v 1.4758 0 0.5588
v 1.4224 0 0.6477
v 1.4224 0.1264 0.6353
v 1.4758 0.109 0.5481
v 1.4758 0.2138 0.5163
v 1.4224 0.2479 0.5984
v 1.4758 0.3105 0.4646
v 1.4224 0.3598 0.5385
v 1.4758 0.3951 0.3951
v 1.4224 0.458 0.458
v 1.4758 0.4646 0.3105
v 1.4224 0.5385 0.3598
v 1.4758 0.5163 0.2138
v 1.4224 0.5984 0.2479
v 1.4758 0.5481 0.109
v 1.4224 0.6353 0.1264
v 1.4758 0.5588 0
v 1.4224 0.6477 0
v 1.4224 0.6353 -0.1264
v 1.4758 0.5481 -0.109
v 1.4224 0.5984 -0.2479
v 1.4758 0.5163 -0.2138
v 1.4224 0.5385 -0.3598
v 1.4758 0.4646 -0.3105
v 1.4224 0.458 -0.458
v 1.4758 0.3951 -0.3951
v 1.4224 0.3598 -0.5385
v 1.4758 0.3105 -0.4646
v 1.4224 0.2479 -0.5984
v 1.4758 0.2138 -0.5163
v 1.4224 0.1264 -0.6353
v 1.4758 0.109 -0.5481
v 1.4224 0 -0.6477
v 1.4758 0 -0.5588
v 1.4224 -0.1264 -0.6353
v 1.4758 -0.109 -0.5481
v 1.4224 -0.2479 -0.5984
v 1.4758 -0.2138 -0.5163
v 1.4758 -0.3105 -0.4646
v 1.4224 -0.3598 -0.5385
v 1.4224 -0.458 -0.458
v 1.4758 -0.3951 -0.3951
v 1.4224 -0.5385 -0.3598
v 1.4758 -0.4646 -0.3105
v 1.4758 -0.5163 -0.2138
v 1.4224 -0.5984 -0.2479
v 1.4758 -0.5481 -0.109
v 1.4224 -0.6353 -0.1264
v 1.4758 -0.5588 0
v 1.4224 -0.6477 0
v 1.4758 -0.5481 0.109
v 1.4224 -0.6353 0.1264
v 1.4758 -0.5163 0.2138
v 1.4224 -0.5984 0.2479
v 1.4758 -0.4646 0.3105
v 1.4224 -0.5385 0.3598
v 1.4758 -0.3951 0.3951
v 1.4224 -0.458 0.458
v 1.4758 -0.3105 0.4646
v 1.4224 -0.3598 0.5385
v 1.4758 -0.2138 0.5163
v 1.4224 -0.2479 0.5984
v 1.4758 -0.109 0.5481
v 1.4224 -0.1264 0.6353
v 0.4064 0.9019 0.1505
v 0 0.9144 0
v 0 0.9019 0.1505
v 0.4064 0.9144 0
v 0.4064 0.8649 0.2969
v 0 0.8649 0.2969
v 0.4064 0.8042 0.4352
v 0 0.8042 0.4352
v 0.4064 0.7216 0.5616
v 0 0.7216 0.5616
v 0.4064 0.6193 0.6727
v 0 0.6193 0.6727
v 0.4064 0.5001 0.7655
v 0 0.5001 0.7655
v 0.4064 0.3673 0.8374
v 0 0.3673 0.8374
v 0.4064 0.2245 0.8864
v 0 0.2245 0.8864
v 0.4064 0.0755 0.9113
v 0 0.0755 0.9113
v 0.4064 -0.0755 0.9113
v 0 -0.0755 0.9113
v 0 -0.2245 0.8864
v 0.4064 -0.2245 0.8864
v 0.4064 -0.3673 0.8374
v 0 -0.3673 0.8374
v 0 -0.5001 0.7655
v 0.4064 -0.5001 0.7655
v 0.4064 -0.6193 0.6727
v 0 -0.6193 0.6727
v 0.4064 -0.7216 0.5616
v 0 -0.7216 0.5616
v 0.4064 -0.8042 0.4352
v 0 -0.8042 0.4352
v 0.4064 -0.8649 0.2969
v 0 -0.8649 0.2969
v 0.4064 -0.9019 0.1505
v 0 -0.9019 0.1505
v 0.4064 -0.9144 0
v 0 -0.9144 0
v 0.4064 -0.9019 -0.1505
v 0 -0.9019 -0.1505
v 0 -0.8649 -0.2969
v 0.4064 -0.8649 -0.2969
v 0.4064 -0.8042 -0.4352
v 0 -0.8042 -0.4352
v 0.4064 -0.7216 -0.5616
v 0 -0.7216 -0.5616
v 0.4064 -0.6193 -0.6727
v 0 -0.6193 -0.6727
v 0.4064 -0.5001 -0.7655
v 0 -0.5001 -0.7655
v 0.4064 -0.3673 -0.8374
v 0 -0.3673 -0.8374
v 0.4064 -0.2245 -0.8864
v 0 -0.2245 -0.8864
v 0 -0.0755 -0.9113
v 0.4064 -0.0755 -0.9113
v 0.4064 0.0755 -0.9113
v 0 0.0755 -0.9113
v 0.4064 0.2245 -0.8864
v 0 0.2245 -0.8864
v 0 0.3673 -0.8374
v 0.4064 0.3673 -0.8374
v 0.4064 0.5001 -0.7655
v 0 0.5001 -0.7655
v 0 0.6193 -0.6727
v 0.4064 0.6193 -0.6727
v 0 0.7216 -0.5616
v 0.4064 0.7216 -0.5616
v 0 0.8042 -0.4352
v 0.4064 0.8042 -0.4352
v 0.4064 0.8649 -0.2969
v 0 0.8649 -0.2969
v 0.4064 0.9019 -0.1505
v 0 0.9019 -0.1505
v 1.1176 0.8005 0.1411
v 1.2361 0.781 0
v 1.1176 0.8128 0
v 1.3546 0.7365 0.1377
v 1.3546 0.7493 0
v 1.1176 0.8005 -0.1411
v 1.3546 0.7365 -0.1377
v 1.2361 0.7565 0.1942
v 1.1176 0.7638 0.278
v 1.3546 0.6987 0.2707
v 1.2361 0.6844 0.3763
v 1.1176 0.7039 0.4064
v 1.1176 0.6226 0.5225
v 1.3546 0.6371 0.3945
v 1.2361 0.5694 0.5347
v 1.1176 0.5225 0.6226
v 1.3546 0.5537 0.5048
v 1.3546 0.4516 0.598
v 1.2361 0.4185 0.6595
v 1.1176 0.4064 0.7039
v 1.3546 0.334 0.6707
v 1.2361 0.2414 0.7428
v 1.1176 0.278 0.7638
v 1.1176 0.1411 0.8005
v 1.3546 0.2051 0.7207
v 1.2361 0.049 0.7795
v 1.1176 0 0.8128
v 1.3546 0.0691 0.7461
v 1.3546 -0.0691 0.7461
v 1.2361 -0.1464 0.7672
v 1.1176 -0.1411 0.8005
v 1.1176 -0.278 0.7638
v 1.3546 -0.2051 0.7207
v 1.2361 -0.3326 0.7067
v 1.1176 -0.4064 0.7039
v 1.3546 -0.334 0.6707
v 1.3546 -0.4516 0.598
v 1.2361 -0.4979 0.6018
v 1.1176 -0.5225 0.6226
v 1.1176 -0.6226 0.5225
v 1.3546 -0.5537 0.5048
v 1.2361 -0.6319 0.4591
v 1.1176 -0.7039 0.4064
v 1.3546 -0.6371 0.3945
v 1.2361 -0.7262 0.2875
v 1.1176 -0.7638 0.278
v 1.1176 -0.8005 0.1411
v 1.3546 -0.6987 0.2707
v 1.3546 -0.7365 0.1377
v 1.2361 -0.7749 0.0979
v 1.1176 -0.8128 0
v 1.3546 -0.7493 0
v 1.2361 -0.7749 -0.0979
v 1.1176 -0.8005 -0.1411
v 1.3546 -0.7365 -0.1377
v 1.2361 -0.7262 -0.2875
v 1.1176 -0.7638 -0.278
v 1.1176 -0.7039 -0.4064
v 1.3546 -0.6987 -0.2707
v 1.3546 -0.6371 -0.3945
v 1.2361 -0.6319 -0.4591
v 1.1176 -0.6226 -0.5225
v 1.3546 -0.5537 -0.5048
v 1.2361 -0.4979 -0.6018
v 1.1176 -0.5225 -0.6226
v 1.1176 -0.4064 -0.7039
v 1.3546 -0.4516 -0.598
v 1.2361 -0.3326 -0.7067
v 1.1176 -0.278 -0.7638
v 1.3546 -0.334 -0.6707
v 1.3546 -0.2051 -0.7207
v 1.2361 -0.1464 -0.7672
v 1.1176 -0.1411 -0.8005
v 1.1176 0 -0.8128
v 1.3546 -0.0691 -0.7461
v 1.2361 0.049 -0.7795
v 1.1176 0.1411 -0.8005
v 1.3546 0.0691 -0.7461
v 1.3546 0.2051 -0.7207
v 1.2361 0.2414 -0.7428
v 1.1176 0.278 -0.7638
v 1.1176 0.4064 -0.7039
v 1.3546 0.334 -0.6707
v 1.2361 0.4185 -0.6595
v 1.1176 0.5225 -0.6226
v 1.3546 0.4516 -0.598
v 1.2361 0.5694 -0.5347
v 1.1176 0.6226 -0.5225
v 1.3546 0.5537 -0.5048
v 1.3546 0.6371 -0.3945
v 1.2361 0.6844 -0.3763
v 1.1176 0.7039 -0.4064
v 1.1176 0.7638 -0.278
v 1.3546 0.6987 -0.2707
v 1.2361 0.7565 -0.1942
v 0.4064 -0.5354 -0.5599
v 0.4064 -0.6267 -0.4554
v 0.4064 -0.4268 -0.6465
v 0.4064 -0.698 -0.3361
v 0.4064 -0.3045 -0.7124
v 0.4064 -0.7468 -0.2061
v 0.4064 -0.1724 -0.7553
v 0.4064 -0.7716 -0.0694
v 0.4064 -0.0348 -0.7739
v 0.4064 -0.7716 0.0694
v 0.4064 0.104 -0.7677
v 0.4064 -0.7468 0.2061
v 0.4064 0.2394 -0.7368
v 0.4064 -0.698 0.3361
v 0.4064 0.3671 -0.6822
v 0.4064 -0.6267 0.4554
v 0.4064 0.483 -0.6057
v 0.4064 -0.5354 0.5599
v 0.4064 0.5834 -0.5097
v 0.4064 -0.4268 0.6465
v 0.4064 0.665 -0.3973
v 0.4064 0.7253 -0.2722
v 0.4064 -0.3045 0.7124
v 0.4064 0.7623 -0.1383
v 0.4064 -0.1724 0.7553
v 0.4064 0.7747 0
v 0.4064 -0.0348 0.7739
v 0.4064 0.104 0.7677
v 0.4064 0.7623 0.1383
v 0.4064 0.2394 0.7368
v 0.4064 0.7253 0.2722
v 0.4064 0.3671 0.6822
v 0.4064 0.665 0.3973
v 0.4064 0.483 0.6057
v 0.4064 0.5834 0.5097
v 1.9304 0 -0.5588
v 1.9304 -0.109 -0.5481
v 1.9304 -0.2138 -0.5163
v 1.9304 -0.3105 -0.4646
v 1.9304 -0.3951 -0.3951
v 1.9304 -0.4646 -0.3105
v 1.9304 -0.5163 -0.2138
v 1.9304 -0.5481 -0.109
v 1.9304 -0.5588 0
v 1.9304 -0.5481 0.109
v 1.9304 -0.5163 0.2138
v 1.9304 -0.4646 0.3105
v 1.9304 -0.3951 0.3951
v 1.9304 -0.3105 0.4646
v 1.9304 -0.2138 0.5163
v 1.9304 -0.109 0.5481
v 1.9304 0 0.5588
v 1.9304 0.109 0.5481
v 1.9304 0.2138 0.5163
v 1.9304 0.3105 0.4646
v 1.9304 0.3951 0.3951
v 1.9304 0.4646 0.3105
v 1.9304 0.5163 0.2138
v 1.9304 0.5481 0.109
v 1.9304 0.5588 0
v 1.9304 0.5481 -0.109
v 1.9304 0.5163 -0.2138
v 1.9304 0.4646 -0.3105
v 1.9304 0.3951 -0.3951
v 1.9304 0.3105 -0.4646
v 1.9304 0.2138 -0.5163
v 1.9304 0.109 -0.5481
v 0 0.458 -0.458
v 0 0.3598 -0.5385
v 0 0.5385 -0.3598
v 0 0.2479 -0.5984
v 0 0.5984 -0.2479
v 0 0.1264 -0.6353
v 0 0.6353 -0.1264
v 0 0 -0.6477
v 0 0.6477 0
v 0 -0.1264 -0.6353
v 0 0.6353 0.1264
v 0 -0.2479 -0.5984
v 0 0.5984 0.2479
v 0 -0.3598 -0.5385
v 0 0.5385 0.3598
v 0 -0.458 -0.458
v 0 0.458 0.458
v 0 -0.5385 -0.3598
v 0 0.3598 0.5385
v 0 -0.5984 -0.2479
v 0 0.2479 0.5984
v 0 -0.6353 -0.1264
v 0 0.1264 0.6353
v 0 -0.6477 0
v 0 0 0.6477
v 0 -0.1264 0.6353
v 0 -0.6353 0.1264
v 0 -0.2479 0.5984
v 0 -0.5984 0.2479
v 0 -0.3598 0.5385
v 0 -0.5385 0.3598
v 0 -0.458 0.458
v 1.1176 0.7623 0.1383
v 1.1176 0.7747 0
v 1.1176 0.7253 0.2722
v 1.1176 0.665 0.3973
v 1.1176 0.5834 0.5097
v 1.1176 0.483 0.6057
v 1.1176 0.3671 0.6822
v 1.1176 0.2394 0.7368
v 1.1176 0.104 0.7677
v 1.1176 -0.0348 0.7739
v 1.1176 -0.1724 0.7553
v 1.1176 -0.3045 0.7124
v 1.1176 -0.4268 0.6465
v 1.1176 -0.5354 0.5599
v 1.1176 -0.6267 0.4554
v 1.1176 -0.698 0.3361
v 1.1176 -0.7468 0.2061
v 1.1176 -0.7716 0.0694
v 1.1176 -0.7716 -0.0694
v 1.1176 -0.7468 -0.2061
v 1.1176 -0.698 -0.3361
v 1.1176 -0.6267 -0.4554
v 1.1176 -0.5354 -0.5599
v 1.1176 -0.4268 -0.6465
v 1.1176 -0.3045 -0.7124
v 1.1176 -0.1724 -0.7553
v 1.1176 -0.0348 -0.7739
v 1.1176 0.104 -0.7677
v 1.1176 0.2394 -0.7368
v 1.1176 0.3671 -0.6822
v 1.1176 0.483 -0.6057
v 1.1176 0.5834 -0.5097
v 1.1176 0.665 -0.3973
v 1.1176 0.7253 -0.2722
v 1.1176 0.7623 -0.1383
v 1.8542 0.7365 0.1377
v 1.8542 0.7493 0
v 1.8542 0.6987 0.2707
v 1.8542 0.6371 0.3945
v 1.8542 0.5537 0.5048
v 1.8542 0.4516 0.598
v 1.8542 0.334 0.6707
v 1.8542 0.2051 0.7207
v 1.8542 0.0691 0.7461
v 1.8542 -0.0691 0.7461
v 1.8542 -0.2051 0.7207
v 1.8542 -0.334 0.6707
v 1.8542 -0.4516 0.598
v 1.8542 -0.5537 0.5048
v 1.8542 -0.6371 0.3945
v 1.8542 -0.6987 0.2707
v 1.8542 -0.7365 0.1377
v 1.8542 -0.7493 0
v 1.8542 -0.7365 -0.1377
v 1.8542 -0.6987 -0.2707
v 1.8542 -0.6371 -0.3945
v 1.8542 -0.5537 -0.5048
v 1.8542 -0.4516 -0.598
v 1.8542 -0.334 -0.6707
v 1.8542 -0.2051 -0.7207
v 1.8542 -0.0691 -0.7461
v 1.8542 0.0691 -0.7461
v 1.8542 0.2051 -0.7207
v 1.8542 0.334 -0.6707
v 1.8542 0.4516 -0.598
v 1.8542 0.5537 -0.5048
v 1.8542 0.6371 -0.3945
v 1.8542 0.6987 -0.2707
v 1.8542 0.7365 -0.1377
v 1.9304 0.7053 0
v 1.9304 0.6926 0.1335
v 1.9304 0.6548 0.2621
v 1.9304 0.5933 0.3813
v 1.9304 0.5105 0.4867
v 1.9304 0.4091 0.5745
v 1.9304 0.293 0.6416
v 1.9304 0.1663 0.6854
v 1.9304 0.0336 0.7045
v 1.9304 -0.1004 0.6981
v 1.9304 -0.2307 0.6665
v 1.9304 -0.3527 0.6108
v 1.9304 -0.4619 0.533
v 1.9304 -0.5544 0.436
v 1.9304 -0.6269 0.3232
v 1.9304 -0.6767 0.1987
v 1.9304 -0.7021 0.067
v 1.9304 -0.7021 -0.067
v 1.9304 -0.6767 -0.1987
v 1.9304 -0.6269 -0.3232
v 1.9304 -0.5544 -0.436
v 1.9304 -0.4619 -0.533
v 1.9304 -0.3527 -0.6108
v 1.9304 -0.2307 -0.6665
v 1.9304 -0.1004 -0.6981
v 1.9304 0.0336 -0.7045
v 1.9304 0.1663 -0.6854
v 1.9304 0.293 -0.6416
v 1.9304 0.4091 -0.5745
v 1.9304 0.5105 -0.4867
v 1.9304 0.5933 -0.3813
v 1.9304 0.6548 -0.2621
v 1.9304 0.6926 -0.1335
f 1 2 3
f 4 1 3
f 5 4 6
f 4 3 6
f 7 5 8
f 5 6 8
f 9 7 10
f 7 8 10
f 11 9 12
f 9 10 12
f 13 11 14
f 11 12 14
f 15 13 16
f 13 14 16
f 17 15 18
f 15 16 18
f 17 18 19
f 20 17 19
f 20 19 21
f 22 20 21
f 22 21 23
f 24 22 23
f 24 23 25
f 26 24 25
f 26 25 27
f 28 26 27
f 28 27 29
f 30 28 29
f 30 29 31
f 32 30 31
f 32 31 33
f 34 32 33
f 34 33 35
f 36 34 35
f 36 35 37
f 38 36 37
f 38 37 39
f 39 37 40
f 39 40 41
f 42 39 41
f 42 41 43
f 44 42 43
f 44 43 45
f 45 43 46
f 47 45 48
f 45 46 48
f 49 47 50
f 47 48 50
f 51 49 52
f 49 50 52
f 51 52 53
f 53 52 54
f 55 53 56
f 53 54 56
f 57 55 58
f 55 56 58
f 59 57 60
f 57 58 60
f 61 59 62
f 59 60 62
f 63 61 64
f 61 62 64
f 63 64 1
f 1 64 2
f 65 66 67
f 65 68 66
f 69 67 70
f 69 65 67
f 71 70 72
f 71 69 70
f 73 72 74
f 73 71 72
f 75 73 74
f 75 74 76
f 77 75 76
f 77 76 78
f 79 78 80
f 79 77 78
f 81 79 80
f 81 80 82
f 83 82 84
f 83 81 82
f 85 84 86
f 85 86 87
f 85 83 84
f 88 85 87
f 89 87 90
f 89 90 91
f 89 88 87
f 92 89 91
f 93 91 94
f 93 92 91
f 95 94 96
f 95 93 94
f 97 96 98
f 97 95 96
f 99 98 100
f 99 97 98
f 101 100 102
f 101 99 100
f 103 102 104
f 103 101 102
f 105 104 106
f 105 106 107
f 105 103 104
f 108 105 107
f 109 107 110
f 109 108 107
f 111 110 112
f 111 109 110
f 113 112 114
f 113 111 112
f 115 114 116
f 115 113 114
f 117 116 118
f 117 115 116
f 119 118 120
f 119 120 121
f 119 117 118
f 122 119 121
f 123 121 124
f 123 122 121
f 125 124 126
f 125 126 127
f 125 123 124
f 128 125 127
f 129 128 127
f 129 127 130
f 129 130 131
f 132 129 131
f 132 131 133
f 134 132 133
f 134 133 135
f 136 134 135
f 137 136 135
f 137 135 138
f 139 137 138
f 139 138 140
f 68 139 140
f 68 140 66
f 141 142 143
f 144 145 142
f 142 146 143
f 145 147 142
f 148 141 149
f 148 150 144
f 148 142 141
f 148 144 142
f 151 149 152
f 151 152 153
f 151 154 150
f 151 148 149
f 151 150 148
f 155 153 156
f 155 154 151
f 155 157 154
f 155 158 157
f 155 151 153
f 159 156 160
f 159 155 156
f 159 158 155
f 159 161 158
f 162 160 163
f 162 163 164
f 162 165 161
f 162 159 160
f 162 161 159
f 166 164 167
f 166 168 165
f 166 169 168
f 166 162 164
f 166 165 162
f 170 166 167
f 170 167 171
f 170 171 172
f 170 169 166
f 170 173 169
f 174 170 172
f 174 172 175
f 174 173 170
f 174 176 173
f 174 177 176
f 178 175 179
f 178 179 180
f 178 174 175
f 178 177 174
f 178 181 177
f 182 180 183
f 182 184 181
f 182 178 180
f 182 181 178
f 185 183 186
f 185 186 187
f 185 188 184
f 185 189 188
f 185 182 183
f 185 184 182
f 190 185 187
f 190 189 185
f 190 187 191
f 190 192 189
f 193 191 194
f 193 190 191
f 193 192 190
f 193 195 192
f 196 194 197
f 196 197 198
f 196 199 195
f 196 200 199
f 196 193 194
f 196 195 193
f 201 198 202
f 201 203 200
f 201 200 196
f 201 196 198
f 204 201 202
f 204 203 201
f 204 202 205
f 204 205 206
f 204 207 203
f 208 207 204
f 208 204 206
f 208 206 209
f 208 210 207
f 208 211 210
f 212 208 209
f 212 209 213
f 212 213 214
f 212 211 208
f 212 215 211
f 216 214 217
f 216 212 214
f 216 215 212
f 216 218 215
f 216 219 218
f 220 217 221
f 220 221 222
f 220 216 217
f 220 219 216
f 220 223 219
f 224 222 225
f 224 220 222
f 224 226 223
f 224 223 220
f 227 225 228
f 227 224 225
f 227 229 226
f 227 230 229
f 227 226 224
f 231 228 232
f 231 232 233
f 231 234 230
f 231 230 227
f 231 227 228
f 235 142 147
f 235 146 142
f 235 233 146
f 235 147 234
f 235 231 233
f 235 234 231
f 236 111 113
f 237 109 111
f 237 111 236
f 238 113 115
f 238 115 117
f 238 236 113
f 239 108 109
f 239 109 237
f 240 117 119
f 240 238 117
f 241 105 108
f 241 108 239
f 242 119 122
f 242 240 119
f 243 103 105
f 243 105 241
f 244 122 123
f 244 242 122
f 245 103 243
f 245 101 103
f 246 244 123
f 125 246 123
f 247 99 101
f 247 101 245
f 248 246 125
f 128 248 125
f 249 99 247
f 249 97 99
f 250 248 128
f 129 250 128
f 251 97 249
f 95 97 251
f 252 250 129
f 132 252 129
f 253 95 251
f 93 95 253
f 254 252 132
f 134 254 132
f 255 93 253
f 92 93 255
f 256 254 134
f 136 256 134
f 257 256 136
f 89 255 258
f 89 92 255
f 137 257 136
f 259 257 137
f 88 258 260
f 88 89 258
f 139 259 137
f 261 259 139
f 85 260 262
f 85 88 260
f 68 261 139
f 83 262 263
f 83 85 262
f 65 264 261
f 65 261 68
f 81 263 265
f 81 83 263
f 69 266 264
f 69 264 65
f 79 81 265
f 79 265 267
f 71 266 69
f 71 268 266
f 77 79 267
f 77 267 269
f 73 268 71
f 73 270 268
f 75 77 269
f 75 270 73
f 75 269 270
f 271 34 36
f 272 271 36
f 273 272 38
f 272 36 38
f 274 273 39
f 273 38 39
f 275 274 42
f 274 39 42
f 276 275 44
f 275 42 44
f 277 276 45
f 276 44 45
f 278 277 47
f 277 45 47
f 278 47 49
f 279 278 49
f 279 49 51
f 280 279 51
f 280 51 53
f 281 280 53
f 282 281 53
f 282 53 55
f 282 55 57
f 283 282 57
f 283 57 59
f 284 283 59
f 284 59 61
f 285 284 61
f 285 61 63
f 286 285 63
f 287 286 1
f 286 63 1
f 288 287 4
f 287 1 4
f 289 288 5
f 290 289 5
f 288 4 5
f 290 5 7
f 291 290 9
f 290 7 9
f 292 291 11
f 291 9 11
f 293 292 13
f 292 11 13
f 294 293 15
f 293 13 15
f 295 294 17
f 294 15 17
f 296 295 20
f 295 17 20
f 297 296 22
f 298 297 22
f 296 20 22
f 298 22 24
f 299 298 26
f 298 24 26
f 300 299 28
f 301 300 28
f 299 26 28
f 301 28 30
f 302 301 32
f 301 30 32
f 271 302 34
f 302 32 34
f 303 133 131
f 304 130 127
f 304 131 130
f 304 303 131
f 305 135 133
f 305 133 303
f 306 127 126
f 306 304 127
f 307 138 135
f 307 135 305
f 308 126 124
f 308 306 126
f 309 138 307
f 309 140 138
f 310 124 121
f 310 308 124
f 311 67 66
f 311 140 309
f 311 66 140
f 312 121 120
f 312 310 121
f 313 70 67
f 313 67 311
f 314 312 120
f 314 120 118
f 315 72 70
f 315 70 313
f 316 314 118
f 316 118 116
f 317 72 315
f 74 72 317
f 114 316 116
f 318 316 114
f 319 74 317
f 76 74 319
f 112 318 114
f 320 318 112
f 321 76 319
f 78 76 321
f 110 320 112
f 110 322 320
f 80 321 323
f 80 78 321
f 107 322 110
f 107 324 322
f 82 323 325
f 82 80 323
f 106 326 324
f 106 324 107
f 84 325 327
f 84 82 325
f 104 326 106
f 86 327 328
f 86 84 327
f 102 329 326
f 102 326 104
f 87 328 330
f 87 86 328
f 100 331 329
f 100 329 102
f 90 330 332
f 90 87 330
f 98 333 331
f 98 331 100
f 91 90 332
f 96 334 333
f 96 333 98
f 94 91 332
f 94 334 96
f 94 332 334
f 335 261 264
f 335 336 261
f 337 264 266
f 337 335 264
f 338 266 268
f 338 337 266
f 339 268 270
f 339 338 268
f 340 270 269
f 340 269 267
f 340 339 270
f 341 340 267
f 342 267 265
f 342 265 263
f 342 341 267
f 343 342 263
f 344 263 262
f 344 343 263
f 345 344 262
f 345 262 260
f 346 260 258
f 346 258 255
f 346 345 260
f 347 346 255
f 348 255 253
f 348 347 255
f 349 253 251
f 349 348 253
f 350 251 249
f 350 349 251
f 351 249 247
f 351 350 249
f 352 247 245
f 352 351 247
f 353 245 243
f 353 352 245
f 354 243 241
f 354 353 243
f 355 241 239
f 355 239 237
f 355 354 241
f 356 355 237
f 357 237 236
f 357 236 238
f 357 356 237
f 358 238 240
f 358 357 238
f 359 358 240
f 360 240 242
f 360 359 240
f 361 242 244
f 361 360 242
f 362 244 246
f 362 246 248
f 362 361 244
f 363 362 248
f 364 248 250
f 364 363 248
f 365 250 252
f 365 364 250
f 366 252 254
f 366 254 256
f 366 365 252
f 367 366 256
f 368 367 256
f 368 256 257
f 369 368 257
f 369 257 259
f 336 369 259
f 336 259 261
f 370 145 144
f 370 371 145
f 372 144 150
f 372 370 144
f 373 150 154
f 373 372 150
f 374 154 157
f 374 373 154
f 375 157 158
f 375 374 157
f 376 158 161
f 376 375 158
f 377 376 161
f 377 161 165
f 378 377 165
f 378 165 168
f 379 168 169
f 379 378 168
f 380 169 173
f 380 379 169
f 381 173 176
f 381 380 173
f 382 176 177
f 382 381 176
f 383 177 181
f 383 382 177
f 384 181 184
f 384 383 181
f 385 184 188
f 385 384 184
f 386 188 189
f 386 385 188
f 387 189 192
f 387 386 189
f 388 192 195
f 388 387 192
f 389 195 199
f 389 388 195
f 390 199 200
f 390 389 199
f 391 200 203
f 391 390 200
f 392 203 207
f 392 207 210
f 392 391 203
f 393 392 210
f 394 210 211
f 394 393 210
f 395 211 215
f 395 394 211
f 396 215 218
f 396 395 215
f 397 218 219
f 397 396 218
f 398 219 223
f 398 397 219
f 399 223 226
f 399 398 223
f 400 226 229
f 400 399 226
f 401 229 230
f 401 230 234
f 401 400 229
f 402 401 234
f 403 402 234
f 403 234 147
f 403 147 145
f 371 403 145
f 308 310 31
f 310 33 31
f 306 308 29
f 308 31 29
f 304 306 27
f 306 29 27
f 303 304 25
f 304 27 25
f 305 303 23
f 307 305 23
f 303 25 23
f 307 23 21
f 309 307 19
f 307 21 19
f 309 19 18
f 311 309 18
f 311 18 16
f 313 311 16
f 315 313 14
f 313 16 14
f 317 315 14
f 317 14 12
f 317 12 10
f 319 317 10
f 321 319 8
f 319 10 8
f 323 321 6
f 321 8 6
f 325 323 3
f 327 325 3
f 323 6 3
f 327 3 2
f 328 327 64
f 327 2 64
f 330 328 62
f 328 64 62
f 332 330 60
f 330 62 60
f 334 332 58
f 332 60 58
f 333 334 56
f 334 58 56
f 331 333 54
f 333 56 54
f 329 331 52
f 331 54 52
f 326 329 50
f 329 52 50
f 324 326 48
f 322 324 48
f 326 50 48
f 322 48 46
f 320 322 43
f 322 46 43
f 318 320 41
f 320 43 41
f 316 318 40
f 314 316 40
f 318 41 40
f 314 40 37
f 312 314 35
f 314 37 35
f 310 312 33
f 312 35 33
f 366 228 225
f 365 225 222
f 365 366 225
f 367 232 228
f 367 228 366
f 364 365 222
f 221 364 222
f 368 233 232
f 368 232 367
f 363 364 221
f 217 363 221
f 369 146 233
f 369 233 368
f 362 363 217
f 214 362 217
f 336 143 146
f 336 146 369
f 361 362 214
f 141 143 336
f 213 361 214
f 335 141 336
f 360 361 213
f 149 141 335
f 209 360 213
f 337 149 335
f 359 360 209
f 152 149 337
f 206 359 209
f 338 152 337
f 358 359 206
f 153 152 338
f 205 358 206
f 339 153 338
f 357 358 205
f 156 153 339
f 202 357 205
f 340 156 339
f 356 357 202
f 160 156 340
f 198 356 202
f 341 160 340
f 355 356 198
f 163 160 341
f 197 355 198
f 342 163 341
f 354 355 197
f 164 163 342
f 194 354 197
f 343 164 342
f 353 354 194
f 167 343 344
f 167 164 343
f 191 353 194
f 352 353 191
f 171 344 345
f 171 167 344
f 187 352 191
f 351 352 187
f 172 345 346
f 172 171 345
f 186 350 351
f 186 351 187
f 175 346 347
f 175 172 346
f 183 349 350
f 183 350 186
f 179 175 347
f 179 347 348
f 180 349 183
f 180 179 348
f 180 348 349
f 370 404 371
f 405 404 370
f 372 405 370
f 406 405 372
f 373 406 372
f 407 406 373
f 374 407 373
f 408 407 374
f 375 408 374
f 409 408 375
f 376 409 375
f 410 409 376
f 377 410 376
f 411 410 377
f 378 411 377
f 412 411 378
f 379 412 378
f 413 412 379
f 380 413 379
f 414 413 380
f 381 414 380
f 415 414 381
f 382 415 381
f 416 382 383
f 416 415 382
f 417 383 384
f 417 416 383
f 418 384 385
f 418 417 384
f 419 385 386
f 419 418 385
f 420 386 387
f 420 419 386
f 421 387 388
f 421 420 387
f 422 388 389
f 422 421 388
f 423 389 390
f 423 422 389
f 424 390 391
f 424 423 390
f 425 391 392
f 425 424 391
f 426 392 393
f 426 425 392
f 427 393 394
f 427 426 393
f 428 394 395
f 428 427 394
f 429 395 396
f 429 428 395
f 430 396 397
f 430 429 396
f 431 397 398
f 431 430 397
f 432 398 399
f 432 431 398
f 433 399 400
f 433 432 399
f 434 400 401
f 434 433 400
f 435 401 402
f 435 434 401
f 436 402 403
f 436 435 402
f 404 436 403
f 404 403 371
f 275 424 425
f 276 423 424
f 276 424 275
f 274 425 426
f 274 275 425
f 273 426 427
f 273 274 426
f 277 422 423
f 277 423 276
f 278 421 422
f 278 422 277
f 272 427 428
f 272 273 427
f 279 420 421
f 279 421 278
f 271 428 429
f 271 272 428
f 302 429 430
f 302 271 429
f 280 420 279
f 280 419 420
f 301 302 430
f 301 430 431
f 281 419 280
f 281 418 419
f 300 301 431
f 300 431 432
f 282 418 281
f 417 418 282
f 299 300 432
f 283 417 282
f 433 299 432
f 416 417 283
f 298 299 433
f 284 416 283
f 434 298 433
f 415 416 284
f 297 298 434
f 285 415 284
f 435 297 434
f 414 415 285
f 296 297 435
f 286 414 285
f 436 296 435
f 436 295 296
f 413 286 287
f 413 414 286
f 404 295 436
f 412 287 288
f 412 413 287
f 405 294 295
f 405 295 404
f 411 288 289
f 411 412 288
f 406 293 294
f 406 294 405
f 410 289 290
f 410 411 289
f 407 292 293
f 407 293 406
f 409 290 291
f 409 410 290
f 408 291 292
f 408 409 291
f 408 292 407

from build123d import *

# Parameters (mm, degrees)
HOLE1_D     = 1.2954
HOLE1_DEPTH = 1.4224
HOLE1_TIP   = 0.389177423
HOLE2_D     = 1.1176
HOLE2_DEPTH = 1.9304
HOLE2_TIP   = 0.335760914


with BuildPart() as part:
    # Sketch1 → RevolutionAngle1 (revolve)
    with BuildSketch(Plane.XY):
        Polygon((0, 0), (0, 0.9144), (0.4064, 0.9144), (0.4064, 0.7747), (1.1176, 0.7747), (1.1176, 0.8128), (1.354585226, 0.7493), (1.8542, 0.7493), (1.9304, 0.705305909), (1.9304, 0), align=None)
    revolve(axis=Axis((0, 0, 0), (1, 0, 0)))

    # Hole1
    with Locations(Plane.ZY):
        with Locations((0, 0)):
            Hole(HOLE1_D / 2, depth=HOLE1_DEPTH)
            with Locations((0, 0, -(HOLE1_DEPTH + HOLE1_TIP / 2))):  # 118° drill point
                Cone(0, HOLE1_D / 2, HOLE1_TIP, mode=Mode.SUBTRACT)

    # Hole2
    with Locations(Plane(origin=(1.9304, 0, 0), x_dir=(0, 0, 1), z_dir=(1, 0, 0))):
        with Locations((0, 0)):
            Hole(HOLE2_D / 2, depth=HOLE2_DEPTH)
            with Locations((0, 0, -(HOLE2_DEPTH + HOLE2_TIP / 2))):  # 118° drill point
                Cone(0, HOLE2_D / 2, HOLE2_TIP, mode=Mode.SUBTRACT)


solid = part.part
